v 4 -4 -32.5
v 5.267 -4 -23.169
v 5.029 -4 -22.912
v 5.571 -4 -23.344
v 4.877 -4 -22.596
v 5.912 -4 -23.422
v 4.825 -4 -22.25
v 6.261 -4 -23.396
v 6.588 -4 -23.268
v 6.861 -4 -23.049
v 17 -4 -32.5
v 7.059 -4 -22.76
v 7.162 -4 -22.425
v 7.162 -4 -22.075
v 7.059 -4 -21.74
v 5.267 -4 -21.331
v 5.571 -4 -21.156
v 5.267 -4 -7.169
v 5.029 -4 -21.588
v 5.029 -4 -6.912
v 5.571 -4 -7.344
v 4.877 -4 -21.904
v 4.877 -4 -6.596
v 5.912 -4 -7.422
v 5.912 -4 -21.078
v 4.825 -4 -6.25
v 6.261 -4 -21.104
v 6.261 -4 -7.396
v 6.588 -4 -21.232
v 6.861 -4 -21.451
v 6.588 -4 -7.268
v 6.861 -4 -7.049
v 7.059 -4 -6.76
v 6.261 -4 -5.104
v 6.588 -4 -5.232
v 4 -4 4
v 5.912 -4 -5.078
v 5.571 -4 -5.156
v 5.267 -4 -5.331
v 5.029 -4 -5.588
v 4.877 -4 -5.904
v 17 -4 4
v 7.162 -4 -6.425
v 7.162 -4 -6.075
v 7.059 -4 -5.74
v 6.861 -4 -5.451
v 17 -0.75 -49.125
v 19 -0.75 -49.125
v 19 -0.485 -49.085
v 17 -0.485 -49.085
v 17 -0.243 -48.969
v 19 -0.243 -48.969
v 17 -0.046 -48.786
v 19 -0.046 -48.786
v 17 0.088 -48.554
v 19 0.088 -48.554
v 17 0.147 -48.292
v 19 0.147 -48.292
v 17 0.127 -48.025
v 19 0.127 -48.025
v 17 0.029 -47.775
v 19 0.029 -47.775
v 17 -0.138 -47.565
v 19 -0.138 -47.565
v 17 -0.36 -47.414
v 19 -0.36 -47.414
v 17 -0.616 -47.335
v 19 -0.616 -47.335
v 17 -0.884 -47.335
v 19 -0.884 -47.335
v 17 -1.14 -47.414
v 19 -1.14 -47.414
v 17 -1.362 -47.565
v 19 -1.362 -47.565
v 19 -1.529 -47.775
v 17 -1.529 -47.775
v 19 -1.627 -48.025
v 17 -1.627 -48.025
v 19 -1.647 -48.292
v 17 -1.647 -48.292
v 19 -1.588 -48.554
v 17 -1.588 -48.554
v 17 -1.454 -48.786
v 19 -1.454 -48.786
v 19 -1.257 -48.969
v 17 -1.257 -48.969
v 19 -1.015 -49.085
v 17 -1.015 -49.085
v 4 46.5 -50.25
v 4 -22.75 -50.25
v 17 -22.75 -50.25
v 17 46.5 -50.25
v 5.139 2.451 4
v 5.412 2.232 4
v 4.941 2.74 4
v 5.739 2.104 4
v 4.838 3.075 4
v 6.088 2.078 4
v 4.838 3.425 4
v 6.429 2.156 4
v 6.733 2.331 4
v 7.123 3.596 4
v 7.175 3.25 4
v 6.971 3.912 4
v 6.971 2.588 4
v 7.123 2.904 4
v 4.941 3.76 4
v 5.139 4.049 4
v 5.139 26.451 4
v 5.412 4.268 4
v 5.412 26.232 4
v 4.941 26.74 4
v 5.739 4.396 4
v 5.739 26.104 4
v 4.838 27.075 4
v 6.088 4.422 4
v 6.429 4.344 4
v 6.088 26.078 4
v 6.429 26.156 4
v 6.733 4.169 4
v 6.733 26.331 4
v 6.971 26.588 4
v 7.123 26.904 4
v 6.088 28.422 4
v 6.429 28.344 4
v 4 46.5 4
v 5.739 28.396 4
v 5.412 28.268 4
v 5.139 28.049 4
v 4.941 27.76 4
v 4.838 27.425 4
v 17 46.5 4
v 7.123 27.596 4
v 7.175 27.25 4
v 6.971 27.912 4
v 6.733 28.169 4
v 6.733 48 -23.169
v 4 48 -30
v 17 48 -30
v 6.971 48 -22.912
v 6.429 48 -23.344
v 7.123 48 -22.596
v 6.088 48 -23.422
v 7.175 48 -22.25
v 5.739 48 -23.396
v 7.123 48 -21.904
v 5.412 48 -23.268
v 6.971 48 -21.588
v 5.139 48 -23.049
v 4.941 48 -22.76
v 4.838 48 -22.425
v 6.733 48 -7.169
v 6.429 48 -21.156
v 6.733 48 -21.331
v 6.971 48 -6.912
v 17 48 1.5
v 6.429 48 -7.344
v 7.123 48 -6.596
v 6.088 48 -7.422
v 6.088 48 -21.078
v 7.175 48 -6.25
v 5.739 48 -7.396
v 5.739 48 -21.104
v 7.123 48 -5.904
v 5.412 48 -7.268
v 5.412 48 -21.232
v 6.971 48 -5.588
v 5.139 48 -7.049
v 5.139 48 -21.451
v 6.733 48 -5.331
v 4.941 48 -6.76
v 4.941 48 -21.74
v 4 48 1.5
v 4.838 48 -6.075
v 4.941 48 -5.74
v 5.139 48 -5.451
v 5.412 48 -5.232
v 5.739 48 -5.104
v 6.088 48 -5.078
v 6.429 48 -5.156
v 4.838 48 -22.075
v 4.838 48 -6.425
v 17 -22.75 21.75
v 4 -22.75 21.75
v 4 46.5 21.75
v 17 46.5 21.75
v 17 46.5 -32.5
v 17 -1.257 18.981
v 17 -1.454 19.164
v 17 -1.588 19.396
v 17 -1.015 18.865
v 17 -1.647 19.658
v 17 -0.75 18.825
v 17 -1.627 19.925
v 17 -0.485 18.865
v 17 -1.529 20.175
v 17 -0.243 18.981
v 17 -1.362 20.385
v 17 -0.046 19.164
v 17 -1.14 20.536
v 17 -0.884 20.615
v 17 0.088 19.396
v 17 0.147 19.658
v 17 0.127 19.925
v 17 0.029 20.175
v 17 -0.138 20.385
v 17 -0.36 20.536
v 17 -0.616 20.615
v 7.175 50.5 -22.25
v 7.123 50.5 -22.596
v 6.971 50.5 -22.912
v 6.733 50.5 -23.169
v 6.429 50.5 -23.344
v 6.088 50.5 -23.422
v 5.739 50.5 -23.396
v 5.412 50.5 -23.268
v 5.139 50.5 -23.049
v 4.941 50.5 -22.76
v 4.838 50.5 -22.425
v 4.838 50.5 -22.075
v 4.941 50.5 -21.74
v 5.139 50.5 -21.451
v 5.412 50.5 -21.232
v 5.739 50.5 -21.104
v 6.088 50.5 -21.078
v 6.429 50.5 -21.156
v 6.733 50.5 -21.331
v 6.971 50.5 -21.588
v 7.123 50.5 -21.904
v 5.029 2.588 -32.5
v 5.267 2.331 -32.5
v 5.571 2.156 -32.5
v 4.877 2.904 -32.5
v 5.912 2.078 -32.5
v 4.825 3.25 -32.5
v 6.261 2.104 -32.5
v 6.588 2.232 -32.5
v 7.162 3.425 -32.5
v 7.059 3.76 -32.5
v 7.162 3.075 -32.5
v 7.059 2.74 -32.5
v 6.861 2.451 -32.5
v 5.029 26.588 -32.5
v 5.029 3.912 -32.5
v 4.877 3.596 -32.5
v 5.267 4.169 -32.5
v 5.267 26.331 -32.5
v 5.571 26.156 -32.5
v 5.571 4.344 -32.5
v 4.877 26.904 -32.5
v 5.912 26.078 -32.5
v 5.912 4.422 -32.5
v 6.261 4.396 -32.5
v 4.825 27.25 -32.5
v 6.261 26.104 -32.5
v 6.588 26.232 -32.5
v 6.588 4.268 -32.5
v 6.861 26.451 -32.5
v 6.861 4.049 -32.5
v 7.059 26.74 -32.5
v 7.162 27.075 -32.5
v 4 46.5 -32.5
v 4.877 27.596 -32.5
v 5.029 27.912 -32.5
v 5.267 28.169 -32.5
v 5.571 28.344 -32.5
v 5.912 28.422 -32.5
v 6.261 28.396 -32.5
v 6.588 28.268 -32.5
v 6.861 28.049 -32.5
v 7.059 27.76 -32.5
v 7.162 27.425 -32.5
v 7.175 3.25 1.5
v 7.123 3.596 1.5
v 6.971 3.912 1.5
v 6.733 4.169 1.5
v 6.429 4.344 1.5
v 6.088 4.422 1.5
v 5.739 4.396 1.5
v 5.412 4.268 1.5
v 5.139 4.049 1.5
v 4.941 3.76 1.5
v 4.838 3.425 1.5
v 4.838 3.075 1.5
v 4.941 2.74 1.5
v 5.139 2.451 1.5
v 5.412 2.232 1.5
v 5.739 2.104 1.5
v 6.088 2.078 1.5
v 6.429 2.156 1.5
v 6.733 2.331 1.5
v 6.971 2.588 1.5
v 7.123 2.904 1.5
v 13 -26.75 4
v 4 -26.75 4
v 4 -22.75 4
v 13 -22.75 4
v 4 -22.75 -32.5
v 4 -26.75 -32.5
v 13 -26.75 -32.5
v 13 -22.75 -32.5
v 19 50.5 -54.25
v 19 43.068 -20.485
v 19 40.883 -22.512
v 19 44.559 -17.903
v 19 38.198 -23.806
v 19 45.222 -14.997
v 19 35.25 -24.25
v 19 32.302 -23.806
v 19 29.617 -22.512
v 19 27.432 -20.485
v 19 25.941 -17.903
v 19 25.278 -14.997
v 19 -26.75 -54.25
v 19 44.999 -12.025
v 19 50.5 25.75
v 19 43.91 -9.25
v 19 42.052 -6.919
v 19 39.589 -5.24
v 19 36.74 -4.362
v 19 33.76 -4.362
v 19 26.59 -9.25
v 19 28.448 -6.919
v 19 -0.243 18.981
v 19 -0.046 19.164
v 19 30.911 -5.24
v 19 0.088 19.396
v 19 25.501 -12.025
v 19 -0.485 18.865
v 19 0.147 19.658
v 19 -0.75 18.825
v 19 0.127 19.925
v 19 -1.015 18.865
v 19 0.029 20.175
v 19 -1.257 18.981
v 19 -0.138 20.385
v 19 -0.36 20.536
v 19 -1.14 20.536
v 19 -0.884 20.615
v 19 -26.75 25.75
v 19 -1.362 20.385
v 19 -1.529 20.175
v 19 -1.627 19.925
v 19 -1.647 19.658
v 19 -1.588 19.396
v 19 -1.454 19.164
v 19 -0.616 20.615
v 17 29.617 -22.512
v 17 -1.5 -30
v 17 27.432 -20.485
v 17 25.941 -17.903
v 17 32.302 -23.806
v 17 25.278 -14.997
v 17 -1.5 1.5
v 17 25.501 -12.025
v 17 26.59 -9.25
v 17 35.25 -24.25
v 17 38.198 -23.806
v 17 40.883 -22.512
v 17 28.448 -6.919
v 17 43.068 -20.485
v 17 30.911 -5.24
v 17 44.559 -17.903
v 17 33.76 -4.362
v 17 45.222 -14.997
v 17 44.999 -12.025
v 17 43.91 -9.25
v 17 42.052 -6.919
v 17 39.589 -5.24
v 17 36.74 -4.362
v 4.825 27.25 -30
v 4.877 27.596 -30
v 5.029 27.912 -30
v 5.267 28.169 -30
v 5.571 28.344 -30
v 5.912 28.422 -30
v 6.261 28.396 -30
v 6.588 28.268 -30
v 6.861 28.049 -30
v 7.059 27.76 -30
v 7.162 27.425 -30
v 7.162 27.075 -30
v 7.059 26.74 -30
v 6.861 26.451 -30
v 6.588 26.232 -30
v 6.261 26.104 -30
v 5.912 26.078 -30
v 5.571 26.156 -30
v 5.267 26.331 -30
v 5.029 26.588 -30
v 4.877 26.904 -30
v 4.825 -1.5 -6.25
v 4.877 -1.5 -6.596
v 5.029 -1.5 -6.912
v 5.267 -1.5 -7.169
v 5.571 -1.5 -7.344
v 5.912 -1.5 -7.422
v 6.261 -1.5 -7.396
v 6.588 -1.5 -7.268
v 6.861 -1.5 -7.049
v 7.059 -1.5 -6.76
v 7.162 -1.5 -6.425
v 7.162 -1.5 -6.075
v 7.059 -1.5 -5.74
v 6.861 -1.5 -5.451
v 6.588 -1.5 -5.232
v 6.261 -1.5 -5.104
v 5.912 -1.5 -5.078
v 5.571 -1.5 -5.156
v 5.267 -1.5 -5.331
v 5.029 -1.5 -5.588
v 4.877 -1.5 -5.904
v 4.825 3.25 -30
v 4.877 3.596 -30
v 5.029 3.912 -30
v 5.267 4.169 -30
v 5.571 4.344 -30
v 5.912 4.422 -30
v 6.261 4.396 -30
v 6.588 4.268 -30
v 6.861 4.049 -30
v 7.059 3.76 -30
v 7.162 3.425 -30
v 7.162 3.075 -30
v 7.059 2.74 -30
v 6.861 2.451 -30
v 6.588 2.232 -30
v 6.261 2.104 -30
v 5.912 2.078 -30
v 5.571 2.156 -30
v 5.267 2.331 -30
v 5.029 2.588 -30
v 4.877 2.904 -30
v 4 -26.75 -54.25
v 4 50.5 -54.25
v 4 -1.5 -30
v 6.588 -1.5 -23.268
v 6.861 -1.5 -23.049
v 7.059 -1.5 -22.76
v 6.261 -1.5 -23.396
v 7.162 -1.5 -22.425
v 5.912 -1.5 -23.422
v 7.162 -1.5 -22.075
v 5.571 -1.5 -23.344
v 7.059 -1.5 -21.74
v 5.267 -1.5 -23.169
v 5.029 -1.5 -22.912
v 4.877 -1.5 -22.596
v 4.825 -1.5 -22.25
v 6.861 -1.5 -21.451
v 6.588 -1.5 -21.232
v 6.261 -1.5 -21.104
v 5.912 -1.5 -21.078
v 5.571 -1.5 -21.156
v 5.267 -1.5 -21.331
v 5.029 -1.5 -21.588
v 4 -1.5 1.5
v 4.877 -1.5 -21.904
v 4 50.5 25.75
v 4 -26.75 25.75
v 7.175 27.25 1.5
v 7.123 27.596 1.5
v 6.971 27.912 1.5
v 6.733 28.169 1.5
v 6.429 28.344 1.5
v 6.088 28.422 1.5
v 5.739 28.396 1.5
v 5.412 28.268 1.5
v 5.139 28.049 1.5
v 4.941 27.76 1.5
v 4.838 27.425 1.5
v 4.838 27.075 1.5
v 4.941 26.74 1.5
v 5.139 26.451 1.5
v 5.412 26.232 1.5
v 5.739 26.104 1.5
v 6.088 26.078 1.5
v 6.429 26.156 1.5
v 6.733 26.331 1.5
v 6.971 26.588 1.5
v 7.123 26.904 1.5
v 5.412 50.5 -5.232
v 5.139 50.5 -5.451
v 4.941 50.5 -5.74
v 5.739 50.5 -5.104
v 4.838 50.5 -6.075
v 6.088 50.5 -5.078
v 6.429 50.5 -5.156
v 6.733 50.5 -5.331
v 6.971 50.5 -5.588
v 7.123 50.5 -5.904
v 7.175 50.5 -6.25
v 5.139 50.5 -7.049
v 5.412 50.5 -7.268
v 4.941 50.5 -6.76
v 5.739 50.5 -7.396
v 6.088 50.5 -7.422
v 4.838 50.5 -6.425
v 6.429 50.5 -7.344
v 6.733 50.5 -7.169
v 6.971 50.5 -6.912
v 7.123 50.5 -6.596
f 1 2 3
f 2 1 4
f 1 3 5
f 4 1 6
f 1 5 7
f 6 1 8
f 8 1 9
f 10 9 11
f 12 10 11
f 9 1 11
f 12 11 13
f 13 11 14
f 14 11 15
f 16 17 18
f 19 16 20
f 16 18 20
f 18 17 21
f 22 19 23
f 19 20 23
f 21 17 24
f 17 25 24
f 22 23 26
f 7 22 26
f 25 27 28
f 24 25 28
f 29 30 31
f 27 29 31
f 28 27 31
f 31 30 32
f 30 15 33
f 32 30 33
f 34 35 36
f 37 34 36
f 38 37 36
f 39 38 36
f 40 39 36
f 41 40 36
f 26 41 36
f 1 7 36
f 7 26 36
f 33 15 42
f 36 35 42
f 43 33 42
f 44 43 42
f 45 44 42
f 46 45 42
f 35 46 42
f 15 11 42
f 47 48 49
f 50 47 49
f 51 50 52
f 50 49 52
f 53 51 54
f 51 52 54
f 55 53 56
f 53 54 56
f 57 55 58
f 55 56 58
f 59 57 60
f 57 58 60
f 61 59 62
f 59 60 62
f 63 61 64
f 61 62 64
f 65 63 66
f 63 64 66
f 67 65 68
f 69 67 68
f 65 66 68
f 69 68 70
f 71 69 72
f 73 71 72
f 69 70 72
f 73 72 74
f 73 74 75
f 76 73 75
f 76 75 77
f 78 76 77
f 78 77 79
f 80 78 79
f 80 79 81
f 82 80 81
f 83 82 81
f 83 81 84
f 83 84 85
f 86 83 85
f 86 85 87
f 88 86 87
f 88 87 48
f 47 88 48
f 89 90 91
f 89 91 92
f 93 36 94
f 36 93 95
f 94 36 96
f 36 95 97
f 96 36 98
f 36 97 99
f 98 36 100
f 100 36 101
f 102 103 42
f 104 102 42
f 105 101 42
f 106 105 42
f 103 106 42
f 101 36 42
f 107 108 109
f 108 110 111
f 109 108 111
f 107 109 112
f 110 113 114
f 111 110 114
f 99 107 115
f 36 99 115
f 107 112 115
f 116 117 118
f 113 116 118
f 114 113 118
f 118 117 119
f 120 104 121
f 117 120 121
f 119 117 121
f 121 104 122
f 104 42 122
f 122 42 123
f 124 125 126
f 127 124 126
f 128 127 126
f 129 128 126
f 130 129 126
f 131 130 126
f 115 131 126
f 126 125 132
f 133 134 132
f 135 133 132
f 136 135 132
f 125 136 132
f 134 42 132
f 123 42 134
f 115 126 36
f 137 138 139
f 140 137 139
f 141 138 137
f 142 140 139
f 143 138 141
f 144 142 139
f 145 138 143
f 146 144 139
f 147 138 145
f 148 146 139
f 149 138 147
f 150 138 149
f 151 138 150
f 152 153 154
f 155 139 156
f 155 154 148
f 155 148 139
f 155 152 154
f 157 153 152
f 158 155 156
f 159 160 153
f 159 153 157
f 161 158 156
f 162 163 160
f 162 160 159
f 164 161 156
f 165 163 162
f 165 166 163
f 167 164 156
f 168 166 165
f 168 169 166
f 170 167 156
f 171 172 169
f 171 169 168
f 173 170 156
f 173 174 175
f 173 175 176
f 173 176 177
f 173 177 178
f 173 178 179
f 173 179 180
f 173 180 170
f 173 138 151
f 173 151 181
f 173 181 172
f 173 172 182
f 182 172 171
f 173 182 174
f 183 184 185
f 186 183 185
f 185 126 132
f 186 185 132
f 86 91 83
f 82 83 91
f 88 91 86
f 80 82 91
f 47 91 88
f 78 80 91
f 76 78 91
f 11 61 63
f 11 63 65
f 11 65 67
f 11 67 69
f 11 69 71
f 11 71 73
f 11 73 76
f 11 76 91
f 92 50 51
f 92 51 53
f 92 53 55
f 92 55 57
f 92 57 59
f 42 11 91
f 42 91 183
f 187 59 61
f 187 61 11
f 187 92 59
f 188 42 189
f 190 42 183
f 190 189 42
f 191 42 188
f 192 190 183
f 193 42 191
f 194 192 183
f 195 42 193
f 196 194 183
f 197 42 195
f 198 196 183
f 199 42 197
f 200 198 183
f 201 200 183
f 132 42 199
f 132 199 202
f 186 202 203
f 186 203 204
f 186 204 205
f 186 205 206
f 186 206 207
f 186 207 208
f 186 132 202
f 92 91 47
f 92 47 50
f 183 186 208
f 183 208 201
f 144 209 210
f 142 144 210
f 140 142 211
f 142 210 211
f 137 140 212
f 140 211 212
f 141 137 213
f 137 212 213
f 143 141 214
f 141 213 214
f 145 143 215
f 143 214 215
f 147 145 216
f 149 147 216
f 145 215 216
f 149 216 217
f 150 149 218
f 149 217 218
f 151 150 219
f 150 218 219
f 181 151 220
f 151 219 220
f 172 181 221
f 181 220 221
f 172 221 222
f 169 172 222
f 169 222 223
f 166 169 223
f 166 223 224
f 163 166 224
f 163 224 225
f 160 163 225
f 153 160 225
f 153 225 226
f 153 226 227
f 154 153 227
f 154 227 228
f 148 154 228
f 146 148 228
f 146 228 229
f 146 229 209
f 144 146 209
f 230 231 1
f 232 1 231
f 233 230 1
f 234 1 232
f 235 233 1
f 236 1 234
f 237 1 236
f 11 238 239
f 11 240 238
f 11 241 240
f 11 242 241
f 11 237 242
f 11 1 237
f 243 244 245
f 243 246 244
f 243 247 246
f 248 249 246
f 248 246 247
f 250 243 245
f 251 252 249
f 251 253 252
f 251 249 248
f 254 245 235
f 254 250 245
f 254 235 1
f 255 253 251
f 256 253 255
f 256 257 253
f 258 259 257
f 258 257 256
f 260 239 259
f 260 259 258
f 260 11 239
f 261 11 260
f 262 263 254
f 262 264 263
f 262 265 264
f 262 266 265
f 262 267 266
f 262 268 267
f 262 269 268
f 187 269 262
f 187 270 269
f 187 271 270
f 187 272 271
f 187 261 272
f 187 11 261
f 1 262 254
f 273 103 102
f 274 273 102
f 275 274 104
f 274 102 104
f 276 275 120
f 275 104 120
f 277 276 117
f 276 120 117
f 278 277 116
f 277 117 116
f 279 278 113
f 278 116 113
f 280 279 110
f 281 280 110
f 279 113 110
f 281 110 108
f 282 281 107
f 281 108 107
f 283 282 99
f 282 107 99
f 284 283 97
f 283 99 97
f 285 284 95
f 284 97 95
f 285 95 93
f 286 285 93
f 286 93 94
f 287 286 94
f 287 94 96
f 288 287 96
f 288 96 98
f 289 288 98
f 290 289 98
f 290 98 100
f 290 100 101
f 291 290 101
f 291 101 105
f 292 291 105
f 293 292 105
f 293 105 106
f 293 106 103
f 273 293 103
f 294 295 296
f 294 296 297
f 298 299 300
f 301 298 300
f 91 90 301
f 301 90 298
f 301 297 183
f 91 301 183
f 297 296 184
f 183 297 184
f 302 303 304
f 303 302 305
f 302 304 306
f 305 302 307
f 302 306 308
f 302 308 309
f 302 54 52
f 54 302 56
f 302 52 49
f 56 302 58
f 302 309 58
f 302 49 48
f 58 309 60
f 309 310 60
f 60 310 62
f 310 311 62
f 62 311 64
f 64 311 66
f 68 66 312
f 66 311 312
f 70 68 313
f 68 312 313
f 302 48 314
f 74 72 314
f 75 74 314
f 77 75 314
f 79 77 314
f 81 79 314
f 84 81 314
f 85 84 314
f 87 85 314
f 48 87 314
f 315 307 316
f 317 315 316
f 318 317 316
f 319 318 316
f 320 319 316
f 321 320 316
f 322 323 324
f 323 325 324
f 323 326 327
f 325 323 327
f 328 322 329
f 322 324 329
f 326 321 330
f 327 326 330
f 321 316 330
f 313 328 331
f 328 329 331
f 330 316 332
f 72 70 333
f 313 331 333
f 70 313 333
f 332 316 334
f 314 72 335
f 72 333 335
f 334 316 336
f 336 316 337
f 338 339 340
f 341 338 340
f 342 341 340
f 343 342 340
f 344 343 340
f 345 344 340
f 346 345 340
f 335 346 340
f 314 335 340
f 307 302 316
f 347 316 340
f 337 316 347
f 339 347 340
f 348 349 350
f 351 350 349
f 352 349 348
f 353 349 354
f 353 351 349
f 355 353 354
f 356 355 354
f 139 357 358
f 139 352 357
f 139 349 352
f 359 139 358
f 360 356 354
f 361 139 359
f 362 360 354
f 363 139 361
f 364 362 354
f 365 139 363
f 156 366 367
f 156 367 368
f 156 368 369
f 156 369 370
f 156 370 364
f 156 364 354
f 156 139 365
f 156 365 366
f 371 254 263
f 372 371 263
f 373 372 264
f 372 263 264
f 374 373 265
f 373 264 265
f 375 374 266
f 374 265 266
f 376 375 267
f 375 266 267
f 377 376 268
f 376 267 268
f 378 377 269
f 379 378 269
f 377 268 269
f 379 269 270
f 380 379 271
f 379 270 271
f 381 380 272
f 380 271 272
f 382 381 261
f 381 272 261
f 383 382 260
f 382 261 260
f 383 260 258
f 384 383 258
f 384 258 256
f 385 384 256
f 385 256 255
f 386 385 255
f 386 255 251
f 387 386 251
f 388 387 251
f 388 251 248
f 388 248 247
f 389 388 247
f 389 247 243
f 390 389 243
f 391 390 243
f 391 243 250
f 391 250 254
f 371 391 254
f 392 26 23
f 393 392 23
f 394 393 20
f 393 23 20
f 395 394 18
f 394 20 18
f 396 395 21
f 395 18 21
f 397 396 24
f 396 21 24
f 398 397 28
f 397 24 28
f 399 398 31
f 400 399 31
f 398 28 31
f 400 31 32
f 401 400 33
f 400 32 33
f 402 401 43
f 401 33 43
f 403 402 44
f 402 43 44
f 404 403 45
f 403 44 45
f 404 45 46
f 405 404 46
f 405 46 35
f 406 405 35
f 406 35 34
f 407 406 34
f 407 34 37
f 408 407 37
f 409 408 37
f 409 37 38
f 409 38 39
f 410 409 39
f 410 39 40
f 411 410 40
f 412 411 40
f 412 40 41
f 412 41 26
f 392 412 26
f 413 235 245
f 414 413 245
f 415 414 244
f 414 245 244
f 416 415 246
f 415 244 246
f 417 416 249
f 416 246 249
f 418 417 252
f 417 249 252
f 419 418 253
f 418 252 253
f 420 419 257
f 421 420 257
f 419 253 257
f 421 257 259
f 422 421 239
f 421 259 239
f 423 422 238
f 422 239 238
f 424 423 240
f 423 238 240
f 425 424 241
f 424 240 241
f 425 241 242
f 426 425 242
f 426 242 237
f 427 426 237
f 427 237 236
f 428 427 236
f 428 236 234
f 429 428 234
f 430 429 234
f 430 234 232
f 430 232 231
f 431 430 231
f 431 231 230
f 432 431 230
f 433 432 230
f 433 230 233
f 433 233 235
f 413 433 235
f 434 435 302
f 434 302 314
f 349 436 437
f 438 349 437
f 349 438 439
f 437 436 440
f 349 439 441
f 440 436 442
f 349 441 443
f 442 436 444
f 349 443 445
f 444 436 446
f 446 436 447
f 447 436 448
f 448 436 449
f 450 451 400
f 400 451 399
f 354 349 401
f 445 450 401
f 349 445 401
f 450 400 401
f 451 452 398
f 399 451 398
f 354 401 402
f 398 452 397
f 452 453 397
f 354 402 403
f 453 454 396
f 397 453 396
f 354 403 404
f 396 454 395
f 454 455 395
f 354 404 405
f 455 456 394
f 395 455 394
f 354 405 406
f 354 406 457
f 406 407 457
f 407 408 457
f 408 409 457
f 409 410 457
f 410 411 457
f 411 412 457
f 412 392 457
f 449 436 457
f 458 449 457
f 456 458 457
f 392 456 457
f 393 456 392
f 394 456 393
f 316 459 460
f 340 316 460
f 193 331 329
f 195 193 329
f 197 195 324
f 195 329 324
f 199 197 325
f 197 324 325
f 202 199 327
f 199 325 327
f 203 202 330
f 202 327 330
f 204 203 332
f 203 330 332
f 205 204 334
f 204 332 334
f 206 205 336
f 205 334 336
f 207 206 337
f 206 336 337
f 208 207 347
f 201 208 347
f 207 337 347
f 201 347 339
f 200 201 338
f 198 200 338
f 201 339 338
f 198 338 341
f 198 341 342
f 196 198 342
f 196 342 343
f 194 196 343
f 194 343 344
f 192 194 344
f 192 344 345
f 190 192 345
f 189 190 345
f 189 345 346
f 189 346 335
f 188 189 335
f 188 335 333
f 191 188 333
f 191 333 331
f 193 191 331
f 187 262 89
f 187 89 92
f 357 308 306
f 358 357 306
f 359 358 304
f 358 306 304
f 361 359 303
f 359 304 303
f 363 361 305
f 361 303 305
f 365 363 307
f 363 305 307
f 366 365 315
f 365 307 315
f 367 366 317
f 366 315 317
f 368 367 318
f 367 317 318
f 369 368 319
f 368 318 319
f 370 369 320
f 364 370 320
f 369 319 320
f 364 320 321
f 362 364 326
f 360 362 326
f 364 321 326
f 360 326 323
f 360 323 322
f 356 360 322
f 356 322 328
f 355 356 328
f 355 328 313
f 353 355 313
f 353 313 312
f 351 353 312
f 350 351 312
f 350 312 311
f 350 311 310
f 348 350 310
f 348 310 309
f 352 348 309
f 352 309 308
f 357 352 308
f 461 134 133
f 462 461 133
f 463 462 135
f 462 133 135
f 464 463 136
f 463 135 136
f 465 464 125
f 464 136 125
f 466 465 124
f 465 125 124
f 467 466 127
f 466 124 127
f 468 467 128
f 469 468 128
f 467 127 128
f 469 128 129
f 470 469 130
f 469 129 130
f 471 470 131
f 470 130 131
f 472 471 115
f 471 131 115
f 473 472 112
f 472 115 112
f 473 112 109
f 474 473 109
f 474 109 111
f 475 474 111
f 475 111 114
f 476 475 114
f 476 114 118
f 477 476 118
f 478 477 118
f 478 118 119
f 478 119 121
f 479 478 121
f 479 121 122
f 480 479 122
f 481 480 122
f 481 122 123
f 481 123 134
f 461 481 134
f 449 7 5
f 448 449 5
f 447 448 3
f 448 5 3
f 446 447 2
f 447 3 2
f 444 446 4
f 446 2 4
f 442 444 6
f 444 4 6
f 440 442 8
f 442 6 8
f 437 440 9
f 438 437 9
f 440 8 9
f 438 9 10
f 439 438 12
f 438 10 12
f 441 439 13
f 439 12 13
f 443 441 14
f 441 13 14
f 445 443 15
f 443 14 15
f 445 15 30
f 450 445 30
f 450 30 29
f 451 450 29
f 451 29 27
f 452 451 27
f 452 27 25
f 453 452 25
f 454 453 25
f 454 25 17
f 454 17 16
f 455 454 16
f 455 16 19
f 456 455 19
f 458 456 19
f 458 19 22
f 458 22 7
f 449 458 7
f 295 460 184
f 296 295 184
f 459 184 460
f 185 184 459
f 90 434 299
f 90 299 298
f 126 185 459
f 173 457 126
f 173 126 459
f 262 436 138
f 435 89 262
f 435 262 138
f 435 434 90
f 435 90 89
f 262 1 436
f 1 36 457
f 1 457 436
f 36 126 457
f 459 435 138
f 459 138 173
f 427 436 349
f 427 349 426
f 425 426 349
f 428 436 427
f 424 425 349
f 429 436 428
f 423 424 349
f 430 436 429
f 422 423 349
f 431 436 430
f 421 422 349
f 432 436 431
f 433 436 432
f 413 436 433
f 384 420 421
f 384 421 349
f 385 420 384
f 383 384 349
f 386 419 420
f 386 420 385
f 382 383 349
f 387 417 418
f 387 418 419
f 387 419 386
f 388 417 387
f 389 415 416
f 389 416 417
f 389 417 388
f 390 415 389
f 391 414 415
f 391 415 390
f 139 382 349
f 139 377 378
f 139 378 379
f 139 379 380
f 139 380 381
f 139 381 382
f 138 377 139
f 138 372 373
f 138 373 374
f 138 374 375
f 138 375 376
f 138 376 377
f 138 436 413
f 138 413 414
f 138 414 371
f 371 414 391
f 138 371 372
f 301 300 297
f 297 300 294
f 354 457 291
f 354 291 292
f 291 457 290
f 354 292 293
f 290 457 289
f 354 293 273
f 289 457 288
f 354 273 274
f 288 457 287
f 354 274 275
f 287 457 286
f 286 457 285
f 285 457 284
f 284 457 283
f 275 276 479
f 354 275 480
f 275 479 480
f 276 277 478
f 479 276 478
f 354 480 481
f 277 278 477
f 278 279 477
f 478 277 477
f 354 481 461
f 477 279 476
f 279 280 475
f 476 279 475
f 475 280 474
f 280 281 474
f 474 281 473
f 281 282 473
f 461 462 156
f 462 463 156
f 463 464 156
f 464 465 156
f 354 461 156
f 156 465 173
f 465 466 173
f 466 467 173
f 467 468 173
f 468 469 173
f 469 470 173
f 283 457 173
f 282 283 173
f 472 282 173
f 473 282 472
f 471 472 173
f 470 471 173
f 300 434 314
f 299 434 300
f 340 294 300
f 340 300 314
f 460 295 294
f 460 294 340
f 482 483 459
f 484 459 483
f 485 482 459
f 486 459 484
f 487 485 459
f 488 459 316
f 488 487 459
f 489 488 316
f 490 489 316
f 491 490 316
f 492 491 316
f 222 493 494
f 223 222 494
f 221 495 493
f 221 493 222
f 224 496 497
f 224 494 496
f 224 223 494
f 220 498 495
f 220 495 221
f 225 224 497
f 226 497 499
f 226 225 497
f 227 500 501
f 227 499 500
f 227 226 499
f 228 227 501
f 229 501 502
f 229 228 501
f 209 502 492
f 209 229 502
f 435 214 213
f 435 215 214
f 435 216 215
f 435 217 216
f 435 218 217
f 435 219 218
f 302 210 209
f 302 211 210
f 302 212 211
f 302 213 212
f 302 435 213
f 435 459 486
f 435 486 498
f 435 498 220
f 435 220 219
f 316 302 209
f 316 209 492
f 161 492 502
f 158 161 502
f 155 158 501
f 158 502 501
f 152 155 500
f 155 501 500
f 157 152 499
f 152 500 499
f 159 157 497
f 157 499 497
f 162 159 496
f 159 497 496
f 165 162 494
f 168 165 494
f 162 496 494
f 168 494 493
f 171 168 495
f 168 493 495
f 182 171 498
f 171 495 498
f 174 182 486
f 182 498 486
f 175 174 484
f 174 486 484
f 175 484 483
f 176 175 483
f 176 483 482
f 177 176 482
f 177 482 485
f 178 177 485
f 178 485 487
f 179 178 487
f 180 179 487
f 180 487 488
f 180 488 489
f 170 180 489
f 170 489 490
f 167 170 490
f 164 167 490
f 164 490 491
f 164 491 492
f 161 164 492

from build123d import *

# Parameters (mm, degrees)
SKETCH_1_W                    = 100
SKETCH_1_H                    = 80
EXTRUDE_1_DEPTH               = 19
SKETCH_2_W                    = 72
SKETCH_2_H                    = 92
CUT_EXTRUDE_1_DEPTH           = 17
SKETCH_3_W                    = 36.5
SKETCH_3_H                    = 54.5
EXTRUDE_2_DEPTH               = 17
SKETCH_4_W                    = 31.5
SKETCH_4_H                    = 49.5
CUT_EXTRUDE_2_DEPTH           = 17
HOLE_WIZARD_20_0_20_1_D       = 20
HOLE_WIZARD_20_0_20_1_DEPTH   = 2
HOLE_WIZARD_2_35_2_35_1_D     = 2.35
HOLE_WIZARD_2_35_2_35_1_DEPTH = 2.5
HOLE_WIZARD_2_35_2_35_2_D     = 2.35
HOLE_WIZARD_2_35_2_35_2_DEPTH = 2.5
HOLE_WIZARD_2_35_2_35_3_D     = 2.35
HOLE_WIZARD_2_35_2_35_3_DEPTH = 2.5
HOLE_WIZARD_2_35_2_35_4_D     = 2.35
HOLE_WIZARD_2_35_2_35_4_DEPTH = 2.5
SKETCH_22_W                   = 13
SKETCH_22_H                   = 36.5
CUT_EXTRUDE_5_DEPTH           = 10
SKETCH_23_W                   = 80
SKETCH_23_H                   = 22.75
CUT_EXTRUDE_6_DEPTH           = 19
SKETCH_24_W                   = 17
SKETCH_24_H                   = 17.75
EXTRUDE_3_DEPTH               = 4
SKETCH_27_W                   = 4
SKETCH_27_H                   = 77.25
CUT_EXTRUDE_7_DEPTH           = 80
SKETCH_28_R                   = 0.9
CUT_EXTRUDE_8_DEPTH           = 10


with BuildPart() as part:
    # 스케치1 → 보스-돌출1 (new body)
    with BuildSketch(Plane(origin=(0, 0, 0), x_dir=(0, -1, 0), z_dir=(-1, 0, 0))):
        with Locations((-23.25, -14.25)):
            Rectangle(SKETCH_1_W, SKETCH_1_H)
    extrude(amount=-EXTRUDE_1_DEPTH)

    # 스케치2 → 컷-돌출1 (cut)
    with BuildSketch(Plane.ZY):
        with Locations((-14.25, 23.25)):
            Rectangle(SKETCH_2_W, SKETCH_2_H)
    extrude(amount=-CUT_EXTRUDE_1_DEPTH, mode=Mode.SUBTRACT)

    # 스케치3 → 보스-돌출2 (add)
    with BuildSketch(Plane.ZY.offset(-17)):
        with Locations((-14.25, 23.25)):
            Rectangle(SKETCH_3_W, SKETCH_3_H)
    extrude(amount=EXTRUDE_2_DEPTH)

    # 스케치4 → 컷-돌출2 (cut)
    with BuildSketch(Plane.ZY):
        with Locations((-14.25, 23.25)):
            Rectangle(SKETCH_4_W, SKETCH_4_H)
    extrude(amount=-CUT_EXTRUDE_2_DEPTH, mode=Mode.SUBTRACT)

    # Ø20.0 (20) 지름 구멍1
    with Locations(Plane.ZY.offset(-17)):
        with Locations((-14.25, 35.25)):
            Hole(HOLE_WIZARD_20_0_20_1_D / 2, depth=HOLE_WIZARD_20_0_20_1_DEPTH)

    # Ø2.35 (2.35) 지름 구멍1
    with Locations(Plane(origin=(0, -1.5, 0), x_dir=(1, 0, 0), z_dir=(0, 1, 0))):
        with Locations((6, 6.25), (6, 22.25)):
            Hole(HOLE_WIZARD_2_35_2_35_1_D / 2, depth=HOLE_WIZARD_2_35_2_35_1_DEPTH)

    # Ø2.35 (2.35) 지름 구멍2
    with Locations(Plane.XY.offset(-30)):
        with Locations((6, 27.25), (6, 3.25)):
            Hole(HOLE_WIZARD_2_35_2_35_2_D / 2, depth=HOLE_WIZARD_2_35_2_35_2_DEPTH)

    # Ø2.35 (2.35) 지름 구멍3
    with Locations(Plane(origin=(0, 48, 0), x_dir=(-1, 0, 0), z_dir=(0, -1, 0))):
        with Locations((-6, 6.25), (-6, 22.25)):
            Hole(HOLE_WIZARD_2_35_2_35_3_D / 2, depth=HOLE_WIZARD_2_35_2_35_3_DEPTH)

    # Ø2.35 (2.35) 지름 구멍4
    with Locations(Plane(origin=(0, 0, 1.5), x_dir=(-1, 0, 0), z_dir=(0, 0, -1))):
        with Locations((-6, 27.25), (-6, 3.25)):
            Hole(HOLE_WIZARD_2_35_2_35_4_D / 2, depth=HOLE_WIZARD_2_35_2_35_4_DEPTH)

    # 스케치22 → 컷-돌출5 (cut)
    with BuildSketch(Plane.XZ.offset(26.75)):
        with Locations((6.5, -14.25)):
            Rectangle(SKETCH_22_W, SKETCH_22_H)
    extrude(amount=-CUT_EXTRUDE_5_DEPTH, mode=Mode.SUBTRACT)

    # 스케치23 → 컷-돌출6 (cut)
    with BuildSketch(Plane.ZY):
        with Locations((-14.25, 61.875)):
            Rectangle(SKETCH_23_W, SKETCH_23_H)
    extrude(amount=-CUT_EXTRUDE_6_DEPTH, mode=Mode.SUBTRACT)

    # 스케치24 → 보스-돌출3 (add)
    with BuildSketch(Plane(origin=(0, 50.5, 0), x_dir=(1, 0, 0), z_dir=(0, 1, 0))):
        with Locations((8.5, -12.875)):
            Rectangle(SKETCH_24_W, SKETCH_24_H)
        with Locations((8.5, 41.375)):
            Rectangle(SKETCH_24_W, SKETCH_24_H)
    extrude(amount=-EXTRUDE_3_DEPTH)

    # 스케치27 → 컷-돌출7 (cut)
    with BuildSketch(Plane(origin=(0, 0, -54.25), x_dir=(-1, 0, 0), z_dir=(0, 0, -1))):
        with Locations((-2, 11.875)):
            Rectangle(SKETCH_27_W, SKETCH_27_H)
    extrude(amount=-CUT_EXTRUDE_7_DEPTH, mode=Mode.SUBTRACT)

    # 스케치28 → 컷-돌출8 (cut)
    with BuildSketch(Plane(origin=(19, 0, 0), x_dir=(0, 0, -1), z_dir=(1, 0, 0))):
        with Locations((-19.725, -0.75)):
            Circle(SKETCH_28_R)
        with Locations((48.225, -0.75)):
            Circle(SKETCH_28_R)
    extrude(amount=-CUT_EXTRUDE_8_DEPTH, mode=Mode.SUBTRACT)


solid = part.part
